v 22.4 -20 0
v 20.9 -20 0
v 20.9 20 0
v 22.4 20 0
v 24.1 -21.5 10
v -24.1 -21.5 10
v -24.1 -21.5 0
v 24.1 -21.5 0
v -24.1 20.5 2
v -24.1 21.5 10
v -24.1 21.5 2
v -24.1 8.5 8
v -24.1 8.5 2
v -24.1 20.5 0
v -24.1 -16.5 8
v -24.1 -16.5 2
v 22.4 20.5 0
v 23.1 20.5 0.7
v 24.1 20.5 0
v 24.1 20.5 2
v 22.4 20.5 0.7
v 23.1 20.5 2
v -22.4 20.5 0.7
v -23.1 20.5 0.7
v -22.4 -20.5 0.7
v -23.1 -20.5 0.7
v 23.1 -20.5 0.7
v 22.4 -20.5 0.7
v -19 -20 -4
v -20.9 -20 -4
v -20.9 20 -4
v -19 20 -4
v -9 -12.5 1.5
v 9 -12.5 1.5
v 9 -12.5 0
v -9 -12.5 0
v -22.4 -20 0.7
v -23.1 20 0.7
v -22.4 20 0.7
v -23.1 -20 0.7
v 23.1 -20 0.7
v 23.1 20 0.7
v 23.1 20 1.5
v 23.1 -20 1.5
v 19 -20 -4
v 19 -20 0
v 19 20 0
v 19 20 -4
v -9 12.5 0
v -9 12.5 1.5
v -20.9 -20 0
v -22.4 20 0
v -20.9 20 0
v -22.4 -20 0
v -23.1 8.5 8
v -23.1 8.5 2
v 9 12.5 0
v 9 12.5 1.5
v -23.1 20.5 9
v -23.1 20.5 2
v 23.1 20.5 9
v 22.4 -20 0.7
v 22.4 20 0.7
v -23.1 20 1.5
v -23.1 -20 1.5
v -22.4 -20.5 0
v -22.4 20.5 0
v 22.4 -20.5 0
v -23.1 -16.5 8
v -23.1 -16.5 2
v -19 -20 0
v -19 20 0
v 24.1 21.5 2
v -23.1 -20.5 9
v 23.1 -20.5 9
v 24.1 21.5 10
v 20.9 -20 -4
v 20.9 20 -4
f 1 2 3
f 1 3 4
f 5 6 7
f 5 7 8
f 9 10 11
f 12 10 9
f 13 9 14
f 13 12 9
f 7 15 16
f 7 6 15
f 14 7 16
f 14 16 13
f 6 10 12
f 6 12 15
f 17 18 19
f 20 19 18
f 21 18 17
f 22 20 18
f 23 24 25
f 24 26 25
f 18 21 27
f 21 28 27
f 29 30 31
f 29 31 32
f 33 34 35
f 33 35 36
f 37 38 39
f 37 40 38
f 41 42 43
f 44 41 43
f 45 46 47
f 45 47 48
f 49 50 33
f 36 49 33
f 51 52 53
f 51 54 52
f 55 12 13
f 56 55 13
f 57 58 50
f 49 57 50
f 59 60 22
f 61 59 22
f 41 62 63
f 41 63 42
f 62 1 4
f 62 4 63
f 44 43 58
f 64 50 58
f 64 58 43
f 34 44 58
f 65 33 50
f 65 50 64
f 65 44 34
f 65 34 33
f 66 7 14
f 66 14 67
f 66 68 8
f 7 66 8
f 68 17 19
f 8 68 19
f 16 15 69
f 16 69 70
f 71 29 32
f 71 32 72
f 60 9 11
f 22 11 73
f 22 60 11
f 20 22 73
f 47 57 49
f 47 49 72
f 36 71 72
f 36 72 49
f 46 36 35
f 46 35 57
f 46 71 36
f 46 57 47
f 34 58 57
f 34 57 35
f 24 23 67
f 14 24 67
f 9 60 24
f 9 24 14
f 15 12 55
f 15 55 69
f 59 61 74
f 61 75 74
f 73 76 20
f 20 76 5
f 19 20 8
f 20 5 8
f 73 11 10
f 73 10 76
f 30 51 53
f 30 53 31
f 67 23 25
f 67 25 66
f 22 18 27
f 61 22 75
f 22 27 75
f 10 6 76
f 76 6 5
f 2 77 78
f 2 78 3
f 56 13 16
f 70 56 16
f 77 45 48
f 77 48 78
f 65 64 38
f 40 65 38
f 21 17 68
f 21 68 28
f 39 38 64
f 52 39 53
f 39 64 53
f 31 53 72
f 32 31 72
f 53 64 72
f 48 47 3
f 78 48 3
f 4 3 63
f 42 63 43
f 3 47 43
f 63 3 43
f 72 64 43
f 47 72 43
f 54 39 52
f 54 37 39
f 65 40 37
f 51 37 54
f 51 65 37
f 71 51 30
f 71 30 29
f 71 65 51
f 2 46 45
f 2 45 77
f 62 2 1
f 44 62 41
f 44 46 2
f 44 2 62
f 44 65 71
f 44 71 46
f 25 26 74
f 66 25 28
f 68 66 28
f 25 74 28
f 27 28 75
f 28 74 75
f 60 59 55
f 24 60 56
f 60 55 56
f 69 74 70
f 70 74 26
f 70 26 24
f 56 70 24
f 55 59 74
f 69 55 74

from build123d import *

# Parameters (mm, degrees)
PAD_DEPTH       = 20
SKETCH001_W     = 18
SKETCH001_H     = 25
POCKET_DEPTH    = 5
PAD001_DEPTH    = 20.5
SKETCH003_W     = 48.2
SKETCH003_H     = 10
PAD002_DEPTH    = 1
SKETCH004_W     = 6
SKETCH004_H     = 25
POCKET001_DEPTH = 5
SKETCH005_W     = 48.2
SKETCH005_H     = 8
PAD003_DEPTH    = 1


with BuildPart() as pocket:
    # Sketch → Pad (new body, symmetric)
    with BuildSketch(Plane.XZ):
        Polygon((-22.4, 0), (-20.9, 0), (-20.9, -4), (-19, -4), (-19, 0), (19, 0), (19, -4), (20.9, -4), (20.9, 0), (22.4, 0), (22.4, 0.7), (23.1, 0.7), (23.1, 1.5), (-23.1, 1.5), (-23.1, 0.7), (-22.4, 0.7), align=None)
    extrude(amount=PAD_DEPTH, both=True)

    # Sketch001 → Pocket (cut)
    with BuildSketch(Plane(origin=(0, 0, 1.5), x_dir=(-1, 0, 0), z_dir=(0, 0, 1))):
        Rectangle(SKETCH001_W, SKETCH001_H)
    extrude(amount=-POCKET_DEPTH, mode=Mode.SUBTRACT)


with BuildPart() as pad003:
    # Sketch002 → Pad001 (new body, symmetric)
    with BuildSketch(Plane.XZ):
        Polygon((-24.1, 0), (-24.1, 10), (24.1, 10), (24.1, 0), (22.4, 0), (22.4, 0.7), (23.1, 0.7), (23.1, 9), (-23.1, 9), (-23.1, 0.7), (-22.4, 0.7), (-22.4, 0), align=None)
    extrude(amount=PAD001_DEPTH, both=True)

    # Sketch003 → Pad002 (new body)
    with BuildSketch(Plane.XZ.offset(20.5)):
        with Locations((0, 5)):
            Rectangle(SKETCH003_W, SKETCH003_H)
    extrude(amount=PAD002_DEPTH)

    # Sketch004 → Pocket001 (cut)
    with BuildSketch(Plane(origin=(-24.1, 0, 0), x_dir=(0, 0, -1), z_dir=(-1, 0, 0))):
        with Locations((-5, 4)):
            Rectangle(SKETCH004_W, SKETCH004_H)
    extrude(amount=-POCKET001_DEPTH, mode=Mode.SUBTRACT)

    # Sketch005 → Pad003 (new body)
    with BuildSketch(Plane(origin=(0, 20.5, 0), x_dir=(1, 0, 0), z_dir=(0, 1, 0))):
        with Locations((0, -6)):
            Rectangle(SKETCH005_W, SKETCH005_H)
    extrude(amount=PAD003_DEPTH)


solid = Compound([pocket.part, pad003.part])
